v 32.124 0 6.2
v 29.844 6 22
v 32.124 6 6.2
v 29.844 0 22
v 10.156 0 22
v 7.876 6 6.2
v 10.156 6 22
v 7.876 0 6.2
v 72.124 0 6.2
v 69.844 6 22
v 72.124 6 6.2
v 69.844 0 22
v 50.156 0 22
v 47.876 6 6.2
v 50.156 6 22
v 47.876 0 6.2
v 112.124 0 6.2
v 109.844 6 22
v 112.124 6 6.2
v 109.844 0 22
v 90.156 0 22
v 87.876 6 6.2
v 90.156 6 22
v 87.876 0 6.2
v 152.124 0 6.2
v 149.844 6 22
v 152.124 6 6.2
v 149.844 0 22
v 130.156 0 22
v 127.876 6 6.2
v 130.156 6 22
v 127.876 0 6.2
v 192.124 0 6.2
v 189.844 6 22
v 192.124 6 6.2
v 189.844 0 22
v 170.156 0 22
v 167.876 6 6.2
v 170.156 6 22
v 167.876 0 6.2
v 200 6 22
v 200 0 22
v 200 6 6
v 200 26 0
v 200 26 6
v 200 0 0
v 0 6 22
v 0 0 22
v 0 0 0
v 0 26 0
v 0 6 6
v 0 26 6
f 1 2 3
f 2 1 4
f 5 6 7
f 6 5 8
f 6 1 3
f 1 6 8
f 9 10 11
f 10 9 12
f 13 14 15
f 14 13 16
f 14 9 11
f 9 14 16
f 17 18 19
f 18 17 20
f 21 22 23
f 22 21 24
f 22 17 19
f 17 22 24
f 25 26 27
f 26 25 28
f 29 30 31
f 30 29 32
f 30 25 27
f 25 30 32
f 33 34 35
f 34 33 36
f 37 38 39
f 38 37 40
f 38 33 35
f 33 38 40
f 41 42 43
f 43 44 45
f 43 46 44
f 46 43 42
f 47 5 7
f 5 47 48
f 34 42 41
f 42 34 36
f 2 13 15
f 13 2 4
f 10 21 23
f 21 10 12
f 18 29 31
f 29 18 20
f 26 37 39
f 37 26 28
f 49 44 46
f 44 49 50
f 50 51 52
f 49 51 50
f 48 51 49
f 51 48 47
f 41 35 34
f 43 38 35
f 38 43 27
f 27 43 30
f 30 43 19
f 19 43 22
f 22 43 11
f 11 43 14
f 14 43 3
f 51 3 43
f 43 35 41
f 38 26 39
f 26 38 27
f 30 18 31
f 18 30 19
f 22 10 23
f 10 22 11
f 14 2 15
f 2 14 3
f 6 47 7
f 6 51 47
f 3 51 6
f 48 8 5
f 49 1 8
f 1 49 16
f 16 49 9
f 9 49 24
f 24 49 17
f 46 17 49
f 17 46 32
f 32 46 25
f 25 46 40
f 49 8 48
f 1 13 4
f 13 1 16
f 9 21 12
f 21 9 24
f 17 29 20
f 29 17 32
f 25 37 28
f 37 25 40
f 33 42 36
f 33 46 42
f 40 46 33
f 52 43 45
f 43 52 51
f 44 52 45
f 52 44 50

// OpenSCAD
// this drives overall part length
cutCount = 5; // [3:10]
// this is a trade between durability/strength and tracing ease 
jigThickness = 6; // [3:10]
// this also drives the overall part length  
dovetailSpacing = 40; // [0:5:100]
// not really a ratio.  just experiment 
spacingToWidthMultiplier = 0.35;  
// also not a ratio
spacingToFenceHeightMultiplier = 0.4;  
// affects angle of dovetail edges - bigger number is more open
dovetailOpeningFactor = 4;  // [2:10]
// how far the solid side of the jig hangs over the edge of the wood
guideOverhang = 20;  // [0:5:100]
// This is just an "extra" factor to help with 3D object difference operations
cutOverlap = 0.2;  

jigLength = dovetailSpacing * (cutCount); 
dovetailWidth = dovetailSpacing * spacingToWidthMultiplier;
fenceHeight = dovetailSpacing * spacingToFenceHeightMultiplier;

union()
{
  cube([jigLength, jigThickness+guideOverhang, jigThickness]);
  difference()
  {
    cube([jigLength, jigThickness, jigThickness + fenceHeight]);
    union()
    {
      for(i = [0:1:cutCount])
      {
        // everything is shifted over by 1/2 spacing, then moved over one more slot per loop
        translate([(dovetailSpacing / 2) + dovetailSpacing * i, jigThickness + cutOverlap, jigThickness + ((dovetailWidth * dovetailOpeningFactor) / 2) + cutOverlap])
        {
          rotate([90, 0, 0])
          {
            // turn upright to aligh with the "fence"
            scale([1, dovetailOpeningFactor, 1])
            {
              // elongate triangle to cut out
              rotate([0, 0, 90])
              {
                // orient triangle sides with base flat on x-axis
                // "cylinder" with 3 faces is a triangle shaped "bar"
                cylinder(d = (dovetailWidth * 2), h = (jigThickness + (cutOverlap * 2)), $fn = 3);
              }
            } 
          }
        }
      }
    }
  }
}
